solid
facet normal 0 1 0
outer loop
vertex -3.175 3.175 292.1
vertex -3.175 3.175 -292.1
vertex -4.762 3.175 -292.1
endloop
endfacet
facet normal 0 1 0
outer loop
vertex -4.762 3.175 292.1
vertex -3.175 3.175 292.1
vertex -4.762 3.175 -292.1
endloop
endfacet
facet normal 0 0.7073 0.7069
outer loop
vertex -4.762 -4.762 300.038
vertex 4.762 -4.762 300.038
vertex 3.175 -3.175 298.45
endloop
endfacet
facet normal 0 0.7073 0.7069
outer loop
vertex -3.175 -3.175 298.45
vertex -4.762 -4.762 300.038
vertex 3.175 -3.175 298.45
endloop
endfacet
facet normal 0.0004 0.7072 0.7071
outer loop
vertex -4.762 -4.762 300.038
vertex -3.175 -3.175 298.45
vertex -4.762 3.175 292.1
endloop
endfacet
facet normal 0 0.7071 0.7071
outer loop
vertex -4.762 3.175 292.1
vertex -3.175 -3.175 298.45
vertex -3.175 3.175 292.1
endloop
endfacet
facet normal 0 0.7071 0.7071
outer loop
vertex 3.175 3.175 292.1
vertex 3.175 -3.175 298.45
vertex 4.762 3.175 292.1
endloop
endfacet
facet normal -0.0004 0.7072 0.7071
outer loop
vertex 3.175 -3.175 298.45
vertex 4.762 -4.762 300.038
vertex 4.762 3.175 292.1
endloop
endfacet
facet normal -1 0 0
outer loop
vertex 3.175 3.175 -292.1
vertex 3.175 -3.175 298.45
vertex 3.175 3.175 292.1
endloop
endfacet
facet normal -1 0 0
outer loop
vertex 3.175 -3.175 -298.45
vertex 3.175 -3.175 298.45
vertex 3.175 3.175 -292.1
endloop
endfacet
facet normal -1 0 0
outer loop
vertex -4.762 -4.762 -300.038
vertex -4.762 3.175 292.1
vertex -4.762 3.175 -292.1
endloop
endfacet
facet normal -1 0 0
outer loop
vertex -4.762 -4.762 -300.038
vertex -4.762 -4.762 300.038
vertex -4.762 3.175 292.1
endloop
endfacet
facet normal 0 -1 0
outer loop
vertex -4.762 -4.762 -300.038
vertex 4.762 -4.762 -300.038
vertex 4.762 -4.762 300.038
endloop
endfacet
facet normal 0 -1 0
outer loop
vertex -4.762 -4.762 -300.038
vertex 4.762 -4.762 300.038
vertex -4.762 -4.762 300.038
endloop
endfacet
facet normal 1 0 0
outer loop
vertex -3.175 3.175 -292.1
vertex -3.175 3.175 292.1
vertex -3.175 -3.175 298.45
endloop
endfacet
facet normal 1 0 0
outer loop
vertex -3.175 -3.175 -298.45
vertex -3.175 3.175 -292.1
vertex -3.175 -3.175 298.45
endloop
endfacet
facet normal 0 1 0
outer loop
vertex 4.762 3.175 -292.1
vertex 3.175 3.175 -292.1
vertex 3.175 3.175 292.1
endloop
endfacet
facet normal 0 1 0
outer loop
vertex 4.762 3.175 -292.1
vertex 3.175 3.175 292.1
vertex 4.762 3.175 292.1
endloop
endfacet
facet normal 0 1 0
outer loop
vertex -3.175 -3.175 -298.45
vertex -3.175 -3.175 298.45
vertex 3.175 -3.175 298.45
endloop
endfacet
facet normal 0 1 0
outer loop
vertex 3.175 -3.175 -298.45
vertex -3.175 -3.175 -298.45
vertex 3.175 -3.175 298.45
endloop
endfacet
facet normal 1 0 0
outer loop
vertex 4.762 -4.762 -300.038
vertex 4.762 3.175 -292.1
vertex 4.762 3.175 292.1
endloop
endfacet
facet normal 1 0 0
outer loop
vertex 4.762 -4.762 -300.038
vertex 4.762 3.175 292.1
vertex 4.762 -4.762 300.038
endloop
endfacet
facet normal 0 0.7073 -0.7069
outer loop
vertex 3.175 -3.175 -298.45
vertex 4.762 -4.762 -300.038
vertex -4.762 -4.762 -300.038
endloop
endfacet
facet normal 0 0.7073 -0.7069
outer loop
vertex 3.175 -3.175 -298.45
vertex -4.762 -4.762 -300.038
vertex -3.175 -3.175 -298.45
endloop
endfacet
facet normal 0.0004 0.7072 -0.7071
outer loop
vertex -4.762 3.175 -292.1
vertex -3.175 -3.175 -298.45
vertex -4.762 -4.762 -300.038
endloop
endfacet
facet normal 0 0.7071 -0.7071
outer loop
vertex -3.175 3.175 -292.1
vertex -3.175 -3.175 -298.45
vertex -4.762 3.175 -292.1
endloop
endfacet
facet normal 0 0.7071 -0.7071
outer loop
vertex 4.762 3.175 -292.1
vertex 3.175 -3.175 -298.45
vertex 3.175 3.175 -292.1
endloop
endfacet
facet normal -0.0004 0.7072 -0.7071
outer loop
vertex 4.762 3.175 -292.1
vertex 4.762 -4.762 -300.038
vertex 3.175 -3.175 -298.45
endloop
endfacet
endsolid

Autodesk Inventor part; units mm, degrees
ref_plane "YZ Plane" through (0, 0, 0) normal (1, 0, 0) x (0, 1, 0)
ref_plane "XZ Plane" through (0, 0, 0) normal (0, 1, 0) x (-1, 0, 0)
ref_plane "XY Plane" through (0, 0, 0) normal (0, 0, 1) x (1, 0, 0)
sketch "Sketch1" plane through (0, 0, 0) normal (0, 0, 1) x (1, 0, 0)
  line L0 (-6.6675, 0) -> (6.6675, 0) projected
  line L1 (0, -6.35) -> (0, 4.7625) projected
  line L2 (-3.175, 3.175) -> (-3.175, -3.175)
  line L3 (-3.175, -3.175) -> (3.175, -3.175)
  line L4 (3.175, -3.175) -> (3.175, 3.175)
  line L5 (4.7625, 3.175) -> (4.7625, -4.7625)
  line L6 (4.7625, -4.7625) -> (-4.7625, -4.7625)
  line L7 (-4.7625, -4.7625) -> (-4.7625, 3.175)
  line L8 (-3.175, 3.175) -> (-4.7625, 3.175)
  line L9 (3.175, 3.175) -> (4.7625, 3.175)
  point P0 (0, 0)
  point P1 (0, -3.175)
  point P2 (-3.175, 0)
  dimension "d0" = 1.5875
  dimension "d1" = 6.35
  dimension "d2" = 6.35
extrude "Extrusion1" add sketch "Sketch1" along normal mid plane 600.075 contours L7 L8 L2 L0 | L0 L2 L3 L1 L6 L7 | L1 L3 L4 L0 L5 L6 | L4 L9 L5 L0
sketch "Sketch2" plane through (4.7625, -4.7625, 300.0375) normal (1, 0, 0) x (0, 0, -1)
  line L0 (0, 7.9375) -> (0, 0) projected
  line L1 (0, 0) -> (600.075, 0) projected
  line L2 (0, 7.9375) -> (600.075, 7.9375) projected
  line L3 (0, 0) -> (7.9375, 7.9375)
  line L4 (7.9375, 7.9375) -> (0, 7.9375)
  line L5 (0, 7.9375) -> (0, 0)
  line L6 (300.0375, 0) -> (300.0375, 7.9375) construction
  line L7 (600.075, 7.9375) -> (600.075, 0)
  line L8 (600.075, 0) -> (592.1375, 7.9375)
  line L9 (600.075, 7.9375) -> (592.1375, 7.9375)
  line L10 (7.9375, 7.9375) -> (0, 7.9375)
  point P0 (300.0375, 4.7625)
  dimension "d5" = 45
extrude "Extrusion2" cut sketch "Sketch2" against normal through all contours L2 L3 L0 | L8 L2 L7
properties part number "c-channel template" material "Aluminum-6061"
